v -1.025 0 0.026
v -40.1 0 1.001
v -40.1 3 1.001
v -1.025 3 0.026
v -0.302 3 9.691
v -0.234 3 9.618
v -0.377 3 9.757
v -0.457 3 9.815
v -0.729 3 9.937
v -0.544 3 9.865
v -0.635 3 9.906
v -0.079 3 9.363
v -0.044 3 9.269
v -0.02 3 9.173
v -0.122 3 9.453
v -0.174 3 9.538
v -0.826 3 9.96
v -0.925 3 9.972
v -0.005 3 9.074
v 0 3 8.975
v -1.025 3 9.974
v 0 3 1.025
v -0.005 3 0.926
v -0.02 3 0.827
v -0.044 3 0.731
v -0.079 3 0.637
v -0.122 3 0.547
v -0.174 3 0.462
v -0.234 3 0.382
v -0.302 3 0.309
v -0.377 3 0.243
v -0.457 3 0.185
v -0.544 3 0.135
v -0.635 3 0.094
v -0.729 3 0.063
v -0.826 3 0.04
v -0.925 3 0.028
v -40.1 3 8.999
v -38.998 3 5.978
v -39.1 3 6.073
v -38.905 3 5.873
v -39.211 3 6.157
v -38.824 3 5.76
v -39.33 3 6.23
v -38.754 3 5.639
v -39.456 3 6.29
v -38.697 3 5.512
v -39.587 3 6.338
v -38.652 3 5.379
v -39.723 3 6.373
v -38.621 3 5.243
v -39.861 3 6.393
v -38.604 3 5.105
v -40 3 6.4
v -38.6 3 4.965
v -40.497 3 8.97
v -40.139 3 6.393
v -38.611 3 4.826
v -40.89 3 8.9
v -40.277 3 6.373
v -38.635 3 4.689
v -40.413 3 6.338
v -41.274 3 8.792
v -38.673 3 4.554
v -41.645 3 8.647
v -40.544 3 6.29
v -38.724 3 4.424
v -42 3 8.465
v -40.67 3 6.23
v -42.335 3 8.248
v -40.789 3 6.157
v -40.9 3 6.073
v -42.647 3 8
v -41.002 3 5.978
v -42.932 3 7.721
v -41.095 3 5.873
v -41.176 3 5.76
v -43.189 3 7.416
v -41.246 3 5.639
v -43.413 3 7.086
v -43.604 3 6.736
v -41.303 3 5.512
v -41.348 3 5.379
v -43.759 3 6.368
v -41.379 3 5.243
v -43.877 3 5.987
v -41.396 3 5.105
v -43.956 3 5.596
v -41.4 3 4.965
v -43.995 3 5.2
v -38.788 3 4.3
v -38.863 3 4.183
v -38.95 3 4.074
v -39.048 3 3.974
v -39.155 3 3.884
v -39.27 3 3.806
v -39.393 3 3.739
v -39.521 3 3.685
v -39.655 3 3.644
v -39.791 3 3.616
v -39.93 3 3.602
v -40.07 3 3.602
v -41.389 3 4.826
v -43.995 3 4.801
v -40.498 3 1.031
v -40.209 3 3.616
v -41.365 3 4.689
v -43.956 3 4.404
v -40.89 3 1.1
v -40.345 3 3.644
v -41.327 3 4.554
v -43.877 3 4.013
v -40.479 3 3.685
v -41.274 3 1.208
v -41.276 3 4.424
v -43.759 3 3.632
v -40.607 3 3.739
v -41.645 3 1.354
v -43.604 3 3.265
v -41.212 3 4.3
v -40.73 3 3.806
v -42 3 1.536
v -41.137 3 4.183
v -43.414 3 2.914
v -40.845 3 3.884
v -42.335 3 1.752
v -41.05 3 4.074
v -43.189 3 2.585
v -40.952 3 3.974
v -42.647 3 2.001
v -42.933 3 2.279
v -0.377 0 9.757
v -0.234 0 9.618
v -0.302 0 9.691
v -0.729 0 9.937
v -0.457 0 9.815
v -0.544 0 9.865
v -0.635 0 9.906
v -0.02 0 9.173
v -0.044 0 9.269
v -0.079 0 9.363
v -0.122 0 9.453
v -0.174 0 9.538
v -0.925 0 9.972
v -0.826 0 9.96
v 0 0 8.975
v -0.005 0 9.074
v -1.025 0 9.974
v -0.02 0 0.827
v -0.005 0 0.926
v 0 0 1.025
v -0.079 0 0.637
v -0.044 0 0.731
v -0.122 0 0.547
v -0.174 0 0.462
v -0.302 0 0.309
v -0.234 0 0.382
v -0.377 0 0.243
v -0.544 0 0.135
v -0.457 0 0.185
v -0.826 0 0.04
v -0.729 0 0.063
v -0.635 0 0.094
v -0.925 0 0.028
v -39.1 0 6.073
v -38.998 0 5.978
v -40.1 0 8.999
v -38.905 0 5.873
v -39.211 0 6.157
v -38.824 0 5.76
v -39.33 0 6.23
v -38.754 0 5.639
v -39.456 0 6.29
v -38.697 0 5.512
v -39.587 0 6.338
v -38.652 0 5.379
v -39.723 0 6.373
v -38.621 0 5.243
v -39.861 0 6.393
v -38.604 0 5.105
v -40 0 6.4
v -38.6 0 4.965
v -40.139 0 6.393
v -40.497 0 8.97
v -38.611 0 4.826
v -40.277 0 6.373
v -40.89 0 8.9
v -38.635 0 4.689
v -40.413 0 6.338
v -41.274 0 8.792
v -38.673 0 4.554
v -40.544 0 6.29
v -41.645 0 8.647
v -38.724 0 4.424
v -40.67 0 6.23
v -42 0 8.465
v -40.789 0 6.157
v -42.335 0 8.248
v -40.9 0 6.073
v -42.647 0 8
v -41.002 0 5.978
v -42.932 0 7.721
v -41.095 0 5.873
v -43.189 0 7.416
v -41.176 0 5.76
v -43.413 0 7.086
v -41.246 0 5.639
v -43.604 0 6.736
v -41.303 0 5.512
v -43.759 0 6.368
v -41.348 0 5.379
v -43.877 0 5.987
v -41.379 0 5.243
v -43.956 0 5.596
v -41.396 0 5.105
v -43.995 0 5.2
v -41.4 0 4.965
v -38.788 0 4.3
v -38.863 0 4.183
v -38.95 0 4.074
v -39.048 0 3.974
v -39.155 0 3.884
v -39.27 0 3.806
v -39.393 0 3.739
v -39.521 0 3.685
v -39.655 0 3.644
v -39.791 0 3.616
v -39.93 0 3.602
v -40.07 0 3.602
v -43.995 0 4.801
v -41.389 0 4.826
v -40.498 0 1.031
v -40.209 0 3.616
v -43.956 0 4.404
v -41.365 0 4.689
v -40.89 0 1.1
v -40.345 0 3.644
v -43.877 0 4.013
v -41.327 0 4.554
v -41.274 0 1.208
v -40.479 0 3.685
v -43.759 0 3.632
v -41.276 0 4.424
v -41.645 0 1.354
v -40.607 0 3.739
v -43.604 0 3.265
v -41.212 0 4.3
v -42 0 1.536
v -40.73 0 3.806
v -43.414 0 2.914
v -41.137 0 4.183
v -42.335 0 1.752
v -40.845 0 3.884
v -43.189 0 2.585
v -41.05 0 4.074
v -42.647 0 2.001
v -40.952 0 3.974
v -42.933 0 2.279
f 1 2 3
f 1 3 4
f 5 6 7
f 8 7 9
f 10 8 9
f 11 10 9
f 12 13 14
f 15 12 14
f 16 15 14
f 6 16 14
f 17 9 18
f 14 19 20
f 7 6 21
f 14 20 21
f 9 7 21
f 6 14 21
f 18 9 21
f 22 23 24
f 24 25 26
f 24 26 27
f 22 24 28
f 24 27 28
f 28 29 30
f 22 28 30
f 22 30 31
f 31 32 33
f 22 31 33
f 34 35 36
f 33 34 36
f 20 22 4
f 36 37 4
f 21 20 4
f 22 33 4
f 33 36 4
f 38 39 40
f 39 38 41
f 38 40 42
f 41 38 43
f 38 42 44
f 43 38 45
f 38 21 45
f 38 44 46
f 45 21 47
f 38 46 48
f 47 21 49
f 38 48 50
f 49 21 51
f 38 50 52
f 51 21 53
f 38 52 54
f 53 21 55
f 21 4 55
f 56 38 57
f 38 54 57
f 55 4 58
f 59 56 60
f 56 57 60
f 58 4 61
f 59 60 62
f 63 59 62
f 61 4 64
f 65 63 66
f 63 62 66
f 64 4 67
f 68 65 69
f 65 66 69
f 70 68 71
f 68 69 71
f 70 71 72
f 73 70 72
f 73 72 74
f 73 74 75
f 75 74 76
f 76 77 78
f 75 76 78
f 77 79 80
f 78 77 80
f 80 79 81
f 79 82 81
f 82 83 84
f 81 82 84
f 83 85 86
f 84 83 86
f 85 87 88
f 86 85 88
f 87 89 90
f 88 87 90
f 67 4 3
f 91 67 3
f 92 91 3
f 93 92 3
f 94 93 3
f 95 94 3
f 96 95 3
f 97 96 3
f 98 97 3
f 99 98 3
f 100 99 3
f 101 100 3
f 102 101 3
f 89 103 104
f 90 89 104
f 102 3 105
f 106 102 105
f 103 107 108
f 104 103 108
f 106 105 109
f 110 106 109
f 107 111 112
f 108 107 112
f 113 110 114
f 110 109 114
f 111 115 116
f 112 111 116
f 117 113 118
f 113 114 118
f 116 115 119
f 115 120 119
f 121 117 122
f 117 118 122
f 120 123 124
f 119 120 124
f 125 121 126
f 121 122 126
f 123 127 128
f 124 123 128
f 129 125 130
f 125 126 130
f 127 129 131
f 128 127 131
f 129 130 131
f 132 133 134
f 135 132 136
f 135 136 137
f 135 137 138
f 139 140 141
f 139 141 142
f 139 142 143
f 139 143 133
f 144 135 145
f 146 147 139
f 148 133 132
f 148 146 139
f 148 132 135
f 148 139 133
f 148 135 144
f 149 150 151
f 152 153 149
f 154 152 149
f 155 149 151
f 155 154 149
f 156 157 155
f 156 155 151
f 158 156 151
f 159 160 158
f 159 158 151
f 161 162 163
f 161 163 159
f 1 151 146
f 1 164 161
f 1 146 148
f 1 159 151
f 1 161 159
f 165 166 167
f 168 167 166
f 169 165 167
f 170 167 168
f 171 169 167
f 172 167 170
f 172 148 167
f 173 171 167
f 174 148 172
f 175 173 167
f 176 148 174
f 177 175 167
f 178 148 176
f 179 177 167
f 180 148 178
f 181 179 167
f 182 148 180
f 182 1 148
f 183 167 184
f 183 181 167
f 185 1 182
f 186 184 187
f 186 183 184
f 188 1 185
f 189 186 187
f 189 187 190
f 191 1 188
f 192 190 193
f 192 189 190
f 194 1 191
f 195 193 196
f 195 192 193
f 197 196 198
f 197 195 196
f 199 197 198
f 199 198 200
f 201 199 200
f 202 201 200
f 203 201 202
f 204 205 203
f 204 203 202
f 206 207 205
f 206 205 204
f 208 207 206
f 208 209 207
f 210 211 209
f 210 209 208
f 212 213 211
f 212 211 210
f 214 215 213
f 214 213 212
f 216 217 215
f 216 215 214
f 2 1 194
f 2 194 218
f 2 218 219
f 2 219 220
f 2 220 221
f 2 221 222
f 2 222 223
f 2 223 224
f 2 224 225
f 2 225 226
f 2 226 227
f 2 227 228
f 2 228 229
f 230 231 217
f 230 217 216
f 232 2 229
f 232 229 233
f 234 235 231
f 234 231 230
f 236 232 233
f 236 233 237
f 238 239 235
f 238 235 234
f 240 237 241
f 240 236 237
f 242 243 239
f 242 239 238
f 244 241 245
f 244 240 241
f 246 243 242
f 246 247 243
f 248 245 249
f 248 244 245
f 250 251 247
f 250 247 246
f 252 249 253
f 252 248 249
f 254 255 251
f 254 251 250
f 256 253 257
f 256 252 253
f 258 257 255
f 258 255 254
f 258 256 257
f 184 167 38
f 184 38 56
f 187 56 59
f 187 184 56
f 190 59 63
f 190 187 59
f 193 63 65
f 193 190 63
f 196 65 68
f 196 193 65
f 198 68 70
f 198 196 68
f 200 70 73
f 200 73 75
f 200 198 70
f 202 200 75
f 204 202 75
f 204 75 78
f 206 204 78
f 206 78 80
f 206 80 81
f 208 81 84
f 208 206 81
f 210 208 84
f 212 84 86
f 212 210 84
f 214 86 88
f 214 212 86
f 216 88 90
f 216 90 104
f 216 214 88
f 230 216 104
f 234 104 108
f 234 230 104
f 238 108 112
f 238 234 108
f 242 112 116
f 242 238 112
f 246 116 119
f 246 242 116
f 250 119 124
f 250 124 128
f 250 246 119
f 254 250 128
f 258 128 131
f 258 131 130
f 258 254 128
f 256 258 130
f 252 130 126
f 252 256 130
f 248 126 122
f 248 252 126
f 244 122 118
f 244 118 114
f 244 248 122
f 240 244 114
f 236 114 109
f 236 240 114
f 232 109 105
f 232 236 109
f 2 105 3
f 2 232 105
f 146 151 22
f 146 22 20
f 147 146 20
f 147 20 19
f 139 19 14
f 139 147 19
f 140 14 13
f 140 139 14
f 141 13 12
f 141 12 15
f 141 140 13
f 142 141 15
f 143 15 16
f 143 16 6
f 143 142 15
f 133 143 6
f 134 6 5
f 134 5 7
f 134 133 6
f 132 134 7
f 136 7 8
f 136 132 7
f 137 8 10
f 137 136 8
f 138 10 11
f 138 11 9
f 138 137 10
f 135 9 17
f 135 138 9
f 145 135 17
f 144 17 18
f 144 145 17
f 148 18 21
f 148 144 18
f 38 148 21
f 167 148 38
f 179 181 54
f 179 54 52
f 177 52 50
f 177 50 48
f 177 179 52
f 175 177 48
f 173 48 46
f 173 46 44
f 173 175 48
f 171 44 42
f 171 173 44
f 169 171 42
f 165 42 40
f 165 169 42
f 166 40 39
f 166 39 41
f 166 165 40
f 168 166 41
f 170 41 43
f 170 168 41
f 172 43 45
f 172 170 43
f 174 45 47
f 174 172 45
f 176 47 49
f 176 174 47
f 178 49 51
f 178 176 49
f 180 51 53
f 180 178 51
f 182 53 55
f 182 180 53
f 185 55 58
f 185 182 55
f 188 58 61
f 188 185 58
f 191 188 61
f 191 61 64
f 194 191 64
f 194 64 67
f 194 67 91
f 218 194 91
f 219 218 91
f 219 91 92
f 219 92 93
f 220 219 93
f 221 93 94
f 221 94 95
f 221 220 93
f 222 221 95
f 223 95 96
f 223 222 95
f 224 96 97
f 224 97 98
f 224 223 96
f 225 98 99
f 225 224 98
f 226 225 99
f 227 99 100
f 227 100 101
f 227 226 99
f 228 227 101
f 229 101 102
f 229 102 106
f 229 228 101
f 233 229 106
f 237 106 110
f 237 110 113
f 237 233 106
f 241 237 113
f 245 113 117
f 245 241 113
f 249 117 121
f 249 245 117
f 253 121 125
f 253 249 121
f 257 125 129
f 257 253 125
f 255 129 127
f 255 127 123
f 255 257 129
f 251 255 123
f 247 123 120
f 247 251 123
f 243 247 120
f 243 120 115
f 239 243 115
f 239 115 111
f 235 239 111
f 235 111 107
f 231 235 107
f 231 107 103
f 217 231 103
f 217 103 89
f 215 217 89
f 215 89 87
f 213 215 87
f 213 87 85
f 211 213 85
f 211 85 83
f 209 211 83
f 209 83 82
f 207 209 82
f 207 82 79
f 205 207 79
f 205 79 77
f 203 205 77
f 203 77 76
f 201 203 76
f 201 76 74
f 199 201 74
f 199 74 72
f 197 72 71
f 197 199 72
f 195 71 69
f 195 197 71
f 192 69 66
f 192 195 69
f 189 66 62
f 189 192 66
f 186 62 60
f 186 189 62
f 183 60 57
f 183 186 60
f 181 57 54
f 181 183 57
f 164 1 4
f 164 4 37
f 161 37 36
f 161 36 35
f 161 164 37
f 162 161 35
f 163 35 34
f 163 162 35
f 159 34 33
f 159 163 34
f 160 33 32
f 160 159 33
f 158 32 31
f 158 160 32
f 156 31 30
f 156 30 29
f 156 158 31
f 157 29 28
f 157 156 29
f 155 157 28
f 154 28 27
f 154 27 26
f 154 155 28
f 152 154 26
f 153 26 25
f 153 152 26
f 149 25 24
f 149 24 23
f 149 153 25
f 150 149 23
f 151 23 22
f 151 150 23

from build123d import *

# Parameters (mm, degrees)
SKETCH1_R           = 1.4
BOSS_EXTRUDE1_DEPTH = 3


with BuildPart() as part:
    # Sketch1 → Boss-Extrude1 (new body)
    with BuildSketch(Plane(origin=(0, 0, 0), x_dir=(1, 0, 0), z_dir=(0, 1, 0))):
        with BuildLine():
            Line((0, -1.025278455), (0, -8.974734883))
            ThreePointArc((0, -8.974734883), (-0.301768682, -9.690607097), (-1.024946053, -9.974423682))
            Line((-1.024946053, -9.974423682), (-40.099818721, -8.999356383))
            ThreePointArc((-40.099818721, -8.999356383), (-44.000366387, -5.000286937), (-40.099870732, -1.001166763))
            Line((-40.099870732, -1.001166763), (-1.024959055, -0.025589981))
            ThreePointArc((-1.024959055, -0.025589981), (-0.301773337, -0.309401701), (0, -1.025278455))
        make_face()
        with Locations(Location((-40.000026017, -5.000260924, 0), (0, 0, 270))):
            Circle(SKETCH1_R, mode=Mode.SUBTRACT)
    extrude(amount=BOSS_EXTRUDE1_DEPTH)


solid = part.part
